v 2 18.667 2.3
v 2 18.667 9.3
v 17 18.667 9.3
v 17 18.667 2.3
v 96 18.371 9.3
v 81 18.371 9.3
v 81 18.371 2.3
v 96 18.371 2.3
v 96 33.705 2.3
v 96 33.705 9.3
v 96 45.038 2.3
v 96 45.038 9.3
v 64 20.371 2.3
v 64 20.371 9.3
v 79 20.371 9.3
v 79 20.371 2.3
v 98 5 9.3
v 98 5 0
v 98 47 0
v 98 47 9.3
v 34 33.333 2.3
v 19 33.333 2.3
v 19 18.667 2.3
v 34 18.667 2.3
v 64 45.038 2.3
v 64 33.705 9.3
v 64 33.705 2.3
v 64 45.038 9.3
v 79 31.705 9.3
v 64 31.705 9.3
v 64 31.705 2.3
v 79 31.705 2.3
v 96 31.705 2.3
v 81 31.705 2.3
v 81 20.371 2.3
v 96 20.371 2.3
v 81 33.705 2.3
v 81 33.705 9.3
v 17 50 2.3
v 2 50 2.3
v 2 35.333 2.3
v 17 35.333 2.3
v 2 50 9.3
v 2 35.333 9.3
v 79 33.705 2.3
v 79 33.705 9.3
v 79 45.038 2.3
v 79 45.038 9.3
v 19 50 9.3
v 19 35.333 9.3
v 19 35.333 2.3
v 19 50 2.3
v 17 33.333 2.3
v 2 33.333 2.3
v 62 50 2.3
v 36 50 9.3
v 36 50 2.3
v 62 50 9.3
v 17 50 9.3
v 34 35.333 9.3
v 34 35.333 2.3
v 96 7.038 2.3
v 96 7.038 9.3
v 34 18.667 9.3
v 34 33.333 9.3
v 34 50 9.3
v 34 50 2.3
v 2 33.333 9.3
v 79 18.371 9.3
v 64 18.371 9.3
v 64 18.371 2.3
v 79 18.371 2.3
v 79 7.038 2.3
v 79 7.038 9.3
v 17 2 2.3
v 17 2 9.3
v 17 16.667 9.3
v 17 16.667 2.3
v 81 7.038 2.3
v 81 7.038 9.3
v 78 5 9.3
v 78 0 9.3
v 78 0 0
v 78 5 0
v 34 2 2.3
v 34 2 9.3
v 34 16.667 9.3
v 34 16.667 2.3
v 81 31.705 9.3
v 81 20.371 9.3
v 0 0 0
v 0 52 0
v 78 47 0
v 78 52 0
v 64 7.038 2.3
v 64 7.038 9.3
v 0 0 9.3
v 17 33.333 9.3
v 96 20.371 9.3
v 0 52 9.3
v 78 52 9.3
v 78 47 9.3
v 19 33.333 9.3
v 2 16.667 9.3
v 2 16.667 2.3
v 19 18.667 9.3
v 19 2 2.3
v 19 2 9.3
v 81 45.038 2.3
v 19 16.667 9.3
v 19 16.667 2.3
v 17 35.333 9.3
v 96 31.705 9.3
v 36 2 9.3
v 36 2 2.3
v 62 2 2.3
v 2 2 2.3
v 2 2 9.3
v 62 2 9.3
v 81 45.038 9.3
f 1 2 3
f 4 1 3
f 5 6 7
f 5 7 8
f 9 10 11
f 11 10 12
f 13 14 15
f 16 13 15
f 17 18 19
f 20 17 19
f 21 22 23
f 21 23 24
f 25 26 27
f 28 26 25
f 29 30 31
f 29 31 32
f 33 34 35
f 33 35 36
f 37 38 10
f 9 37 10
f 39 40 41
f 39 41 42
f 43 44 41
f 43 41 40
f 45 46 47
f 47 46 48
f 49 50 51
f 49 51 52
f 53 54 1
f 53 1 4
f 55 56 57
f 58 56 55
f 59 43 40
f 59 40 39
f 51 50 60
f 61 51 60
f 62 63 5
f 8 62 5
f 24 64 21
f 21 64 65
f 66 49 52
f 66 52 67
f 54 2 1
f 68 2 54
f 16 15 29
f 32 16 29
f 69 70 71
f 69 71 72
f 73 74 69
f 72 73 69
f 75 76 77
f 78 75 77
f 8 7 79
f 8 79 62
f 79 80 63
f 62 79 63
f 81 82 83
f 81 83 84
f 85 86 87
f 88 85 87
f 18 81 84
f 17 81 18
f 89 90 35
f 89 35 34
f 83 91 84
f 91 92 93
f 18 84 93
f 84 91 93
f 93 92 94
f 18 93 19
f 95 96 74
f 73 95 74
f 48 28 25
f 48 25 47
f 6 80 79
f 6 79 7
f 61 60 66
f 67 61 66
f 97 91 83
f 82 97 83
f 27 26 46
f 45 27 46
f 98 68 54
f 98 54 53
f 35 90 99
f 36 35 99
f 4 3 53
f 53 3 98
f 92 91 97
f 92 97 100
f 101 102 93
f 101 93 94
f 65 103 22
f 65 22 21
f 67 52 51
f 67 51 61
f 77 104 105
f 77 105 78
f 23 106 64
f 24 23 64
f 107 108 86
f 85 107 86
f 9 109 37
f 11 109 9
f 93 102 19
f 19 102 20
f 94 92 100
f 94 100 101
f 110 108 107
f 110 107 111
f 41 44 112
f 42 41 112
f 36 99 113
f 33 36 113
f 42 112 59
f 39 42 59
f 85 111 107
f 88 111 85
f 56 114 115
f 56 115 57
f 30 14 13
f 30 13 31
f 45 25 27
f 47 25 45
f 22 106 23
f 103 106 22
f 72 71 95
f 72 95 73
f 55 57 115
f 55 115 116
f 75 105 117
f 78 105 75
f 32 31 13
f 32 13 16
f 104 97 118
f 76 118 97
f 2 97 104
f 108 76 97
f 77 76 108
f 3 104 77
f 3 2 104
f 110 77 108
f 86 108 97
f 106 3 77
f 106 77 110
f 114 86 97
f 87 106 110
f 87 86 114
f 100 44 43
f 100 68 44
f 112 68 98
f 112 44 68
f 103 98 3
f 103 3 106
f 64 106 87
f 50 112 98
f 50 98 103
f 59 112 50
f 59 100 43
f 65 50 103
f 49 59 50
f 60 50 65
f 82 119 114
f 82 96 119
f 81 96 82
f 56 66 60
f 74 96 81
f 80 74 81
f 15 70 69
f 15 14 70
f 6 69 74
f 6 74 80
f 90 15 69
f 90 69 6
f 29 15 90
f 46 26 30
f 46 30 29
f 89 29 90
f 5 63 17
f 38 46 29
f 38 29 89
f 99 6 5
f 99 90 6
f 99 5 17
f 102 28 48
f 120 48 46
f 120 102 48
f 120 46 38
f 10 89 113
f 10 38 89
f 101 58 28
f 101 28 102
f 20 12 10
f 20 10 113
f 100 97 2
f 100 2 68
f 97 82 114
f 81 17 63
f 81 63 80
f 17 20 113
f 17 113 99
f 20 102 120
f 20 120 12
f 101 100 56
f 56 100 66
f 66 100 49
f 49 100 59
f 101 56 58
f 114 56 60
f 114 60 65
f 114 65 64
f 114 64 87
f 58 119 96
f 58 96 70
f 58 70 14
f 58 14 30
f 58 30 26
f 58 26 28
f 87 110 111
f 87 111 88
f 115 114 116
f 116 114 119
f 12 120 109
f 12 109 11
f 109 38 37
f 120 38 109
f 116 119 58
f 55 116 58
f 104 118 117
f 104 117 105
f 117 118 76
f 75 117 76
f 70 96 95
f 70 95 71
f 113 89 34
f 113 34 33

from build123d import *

# Parameters (mm, degrees)
SKETCH_W        = 98
SKETCH_H        = 52
PAD_DEPTH       = 9.3
SKETCH001_W     = 20
SKETCH001_H     = 5
POCKET_DEPTH    = 9.301
SKETCH002_W     = 15
SKETCH002_H     = 14.666667
SKETCH002_H_2   = 14.666666
SKETCH002_W_2   = 26
SKETCH002_H_3   = 48
SKETCH002_H_4   = 11.333333
SKETCH002_H_5   = 11.333334
POCKET001_DEPTH = 7


with BuildPart() as part:
    # Sketch → Pad (new body)
    with BuildSketch(Plane.XY):
        with Locations((49, 26)):
            Rectangle(SKETCH_W, SKETCH_H)
    extrude(amount=PAD_DEPTH)

    # Sketch001 (on Face6 of Pad) → Pocket (cut, through all)
    with BuildSketch(Plane.XY.offset(9.3)):
        with Locations((88, 49.5)):
            Rectangle(SKETCH001_W, SKETCH001_H)
        with Locations((88, 2.5)):
            Rectangle(SKETCH001_W, SKETCH001_H)
    extrude(amount=-POCKET_DEPTH, mode=Mode.SUBTRACT)

    # Sketch002 (on Face6 of Pad) → Pocket001 (cut)
    with BuildSketch(Plane.XY.offset(9.3)):
        with Locations((9.5, 42.666666)):
            Rectangle(SKETCH002_W, SKETCH002_H)
        with Locations((9.5, 26)):
            Rectangle(SKETCH002_W, SKETCH002_H_2)
        with Locations((9.5, 9.333334)):
            Rectangle(SKETCH002_W, SKETCH002_H)
        with Locations((26.5, 42.666666)):
            Rectangle(SKETCH002_W, SKETCH002_H)
        with Locations((26.5, 26)):
            Rectangle(SKETCH002_W, SKETCH002_H_2)
        with Locations((26.5, 9.333334)):
            Rectangle(SKETCH002_W, SKETCH002_H)
        with Locations((49, 26)):
            Rectangle(SKETCH002_W_2, SKETCH002_H_3)
        with Locations((71.5, 39.371451)):
            Rectangle(SKETCH002_W, SKETCH002_H_4)
        with Locations((71.5, 26.038118)):
            Rectangle(SKETCH002_W, SKETCH002_H_5)
        with Locations((71.5, 12.704785)):
            Rectangle(SKETCH002_W, SKETCH002_H_4)
        with Locations((88.5, 39.371451)):
            Rectangle(SKETCH002_W, SKETCH002_H_4)
        with Locations((88.5, 26.038118)):
            Rectangle(SKETCH002_W, SKETCH002_H_5)
        with Locations((88.5, 12.704785)):
            Rectangle(SKETCH002_W, SKETCH002_H_4)
    extrude(amount=-POCKET001_DEPTH, mode=Mode.SUBTRACT)


solid = part.part
